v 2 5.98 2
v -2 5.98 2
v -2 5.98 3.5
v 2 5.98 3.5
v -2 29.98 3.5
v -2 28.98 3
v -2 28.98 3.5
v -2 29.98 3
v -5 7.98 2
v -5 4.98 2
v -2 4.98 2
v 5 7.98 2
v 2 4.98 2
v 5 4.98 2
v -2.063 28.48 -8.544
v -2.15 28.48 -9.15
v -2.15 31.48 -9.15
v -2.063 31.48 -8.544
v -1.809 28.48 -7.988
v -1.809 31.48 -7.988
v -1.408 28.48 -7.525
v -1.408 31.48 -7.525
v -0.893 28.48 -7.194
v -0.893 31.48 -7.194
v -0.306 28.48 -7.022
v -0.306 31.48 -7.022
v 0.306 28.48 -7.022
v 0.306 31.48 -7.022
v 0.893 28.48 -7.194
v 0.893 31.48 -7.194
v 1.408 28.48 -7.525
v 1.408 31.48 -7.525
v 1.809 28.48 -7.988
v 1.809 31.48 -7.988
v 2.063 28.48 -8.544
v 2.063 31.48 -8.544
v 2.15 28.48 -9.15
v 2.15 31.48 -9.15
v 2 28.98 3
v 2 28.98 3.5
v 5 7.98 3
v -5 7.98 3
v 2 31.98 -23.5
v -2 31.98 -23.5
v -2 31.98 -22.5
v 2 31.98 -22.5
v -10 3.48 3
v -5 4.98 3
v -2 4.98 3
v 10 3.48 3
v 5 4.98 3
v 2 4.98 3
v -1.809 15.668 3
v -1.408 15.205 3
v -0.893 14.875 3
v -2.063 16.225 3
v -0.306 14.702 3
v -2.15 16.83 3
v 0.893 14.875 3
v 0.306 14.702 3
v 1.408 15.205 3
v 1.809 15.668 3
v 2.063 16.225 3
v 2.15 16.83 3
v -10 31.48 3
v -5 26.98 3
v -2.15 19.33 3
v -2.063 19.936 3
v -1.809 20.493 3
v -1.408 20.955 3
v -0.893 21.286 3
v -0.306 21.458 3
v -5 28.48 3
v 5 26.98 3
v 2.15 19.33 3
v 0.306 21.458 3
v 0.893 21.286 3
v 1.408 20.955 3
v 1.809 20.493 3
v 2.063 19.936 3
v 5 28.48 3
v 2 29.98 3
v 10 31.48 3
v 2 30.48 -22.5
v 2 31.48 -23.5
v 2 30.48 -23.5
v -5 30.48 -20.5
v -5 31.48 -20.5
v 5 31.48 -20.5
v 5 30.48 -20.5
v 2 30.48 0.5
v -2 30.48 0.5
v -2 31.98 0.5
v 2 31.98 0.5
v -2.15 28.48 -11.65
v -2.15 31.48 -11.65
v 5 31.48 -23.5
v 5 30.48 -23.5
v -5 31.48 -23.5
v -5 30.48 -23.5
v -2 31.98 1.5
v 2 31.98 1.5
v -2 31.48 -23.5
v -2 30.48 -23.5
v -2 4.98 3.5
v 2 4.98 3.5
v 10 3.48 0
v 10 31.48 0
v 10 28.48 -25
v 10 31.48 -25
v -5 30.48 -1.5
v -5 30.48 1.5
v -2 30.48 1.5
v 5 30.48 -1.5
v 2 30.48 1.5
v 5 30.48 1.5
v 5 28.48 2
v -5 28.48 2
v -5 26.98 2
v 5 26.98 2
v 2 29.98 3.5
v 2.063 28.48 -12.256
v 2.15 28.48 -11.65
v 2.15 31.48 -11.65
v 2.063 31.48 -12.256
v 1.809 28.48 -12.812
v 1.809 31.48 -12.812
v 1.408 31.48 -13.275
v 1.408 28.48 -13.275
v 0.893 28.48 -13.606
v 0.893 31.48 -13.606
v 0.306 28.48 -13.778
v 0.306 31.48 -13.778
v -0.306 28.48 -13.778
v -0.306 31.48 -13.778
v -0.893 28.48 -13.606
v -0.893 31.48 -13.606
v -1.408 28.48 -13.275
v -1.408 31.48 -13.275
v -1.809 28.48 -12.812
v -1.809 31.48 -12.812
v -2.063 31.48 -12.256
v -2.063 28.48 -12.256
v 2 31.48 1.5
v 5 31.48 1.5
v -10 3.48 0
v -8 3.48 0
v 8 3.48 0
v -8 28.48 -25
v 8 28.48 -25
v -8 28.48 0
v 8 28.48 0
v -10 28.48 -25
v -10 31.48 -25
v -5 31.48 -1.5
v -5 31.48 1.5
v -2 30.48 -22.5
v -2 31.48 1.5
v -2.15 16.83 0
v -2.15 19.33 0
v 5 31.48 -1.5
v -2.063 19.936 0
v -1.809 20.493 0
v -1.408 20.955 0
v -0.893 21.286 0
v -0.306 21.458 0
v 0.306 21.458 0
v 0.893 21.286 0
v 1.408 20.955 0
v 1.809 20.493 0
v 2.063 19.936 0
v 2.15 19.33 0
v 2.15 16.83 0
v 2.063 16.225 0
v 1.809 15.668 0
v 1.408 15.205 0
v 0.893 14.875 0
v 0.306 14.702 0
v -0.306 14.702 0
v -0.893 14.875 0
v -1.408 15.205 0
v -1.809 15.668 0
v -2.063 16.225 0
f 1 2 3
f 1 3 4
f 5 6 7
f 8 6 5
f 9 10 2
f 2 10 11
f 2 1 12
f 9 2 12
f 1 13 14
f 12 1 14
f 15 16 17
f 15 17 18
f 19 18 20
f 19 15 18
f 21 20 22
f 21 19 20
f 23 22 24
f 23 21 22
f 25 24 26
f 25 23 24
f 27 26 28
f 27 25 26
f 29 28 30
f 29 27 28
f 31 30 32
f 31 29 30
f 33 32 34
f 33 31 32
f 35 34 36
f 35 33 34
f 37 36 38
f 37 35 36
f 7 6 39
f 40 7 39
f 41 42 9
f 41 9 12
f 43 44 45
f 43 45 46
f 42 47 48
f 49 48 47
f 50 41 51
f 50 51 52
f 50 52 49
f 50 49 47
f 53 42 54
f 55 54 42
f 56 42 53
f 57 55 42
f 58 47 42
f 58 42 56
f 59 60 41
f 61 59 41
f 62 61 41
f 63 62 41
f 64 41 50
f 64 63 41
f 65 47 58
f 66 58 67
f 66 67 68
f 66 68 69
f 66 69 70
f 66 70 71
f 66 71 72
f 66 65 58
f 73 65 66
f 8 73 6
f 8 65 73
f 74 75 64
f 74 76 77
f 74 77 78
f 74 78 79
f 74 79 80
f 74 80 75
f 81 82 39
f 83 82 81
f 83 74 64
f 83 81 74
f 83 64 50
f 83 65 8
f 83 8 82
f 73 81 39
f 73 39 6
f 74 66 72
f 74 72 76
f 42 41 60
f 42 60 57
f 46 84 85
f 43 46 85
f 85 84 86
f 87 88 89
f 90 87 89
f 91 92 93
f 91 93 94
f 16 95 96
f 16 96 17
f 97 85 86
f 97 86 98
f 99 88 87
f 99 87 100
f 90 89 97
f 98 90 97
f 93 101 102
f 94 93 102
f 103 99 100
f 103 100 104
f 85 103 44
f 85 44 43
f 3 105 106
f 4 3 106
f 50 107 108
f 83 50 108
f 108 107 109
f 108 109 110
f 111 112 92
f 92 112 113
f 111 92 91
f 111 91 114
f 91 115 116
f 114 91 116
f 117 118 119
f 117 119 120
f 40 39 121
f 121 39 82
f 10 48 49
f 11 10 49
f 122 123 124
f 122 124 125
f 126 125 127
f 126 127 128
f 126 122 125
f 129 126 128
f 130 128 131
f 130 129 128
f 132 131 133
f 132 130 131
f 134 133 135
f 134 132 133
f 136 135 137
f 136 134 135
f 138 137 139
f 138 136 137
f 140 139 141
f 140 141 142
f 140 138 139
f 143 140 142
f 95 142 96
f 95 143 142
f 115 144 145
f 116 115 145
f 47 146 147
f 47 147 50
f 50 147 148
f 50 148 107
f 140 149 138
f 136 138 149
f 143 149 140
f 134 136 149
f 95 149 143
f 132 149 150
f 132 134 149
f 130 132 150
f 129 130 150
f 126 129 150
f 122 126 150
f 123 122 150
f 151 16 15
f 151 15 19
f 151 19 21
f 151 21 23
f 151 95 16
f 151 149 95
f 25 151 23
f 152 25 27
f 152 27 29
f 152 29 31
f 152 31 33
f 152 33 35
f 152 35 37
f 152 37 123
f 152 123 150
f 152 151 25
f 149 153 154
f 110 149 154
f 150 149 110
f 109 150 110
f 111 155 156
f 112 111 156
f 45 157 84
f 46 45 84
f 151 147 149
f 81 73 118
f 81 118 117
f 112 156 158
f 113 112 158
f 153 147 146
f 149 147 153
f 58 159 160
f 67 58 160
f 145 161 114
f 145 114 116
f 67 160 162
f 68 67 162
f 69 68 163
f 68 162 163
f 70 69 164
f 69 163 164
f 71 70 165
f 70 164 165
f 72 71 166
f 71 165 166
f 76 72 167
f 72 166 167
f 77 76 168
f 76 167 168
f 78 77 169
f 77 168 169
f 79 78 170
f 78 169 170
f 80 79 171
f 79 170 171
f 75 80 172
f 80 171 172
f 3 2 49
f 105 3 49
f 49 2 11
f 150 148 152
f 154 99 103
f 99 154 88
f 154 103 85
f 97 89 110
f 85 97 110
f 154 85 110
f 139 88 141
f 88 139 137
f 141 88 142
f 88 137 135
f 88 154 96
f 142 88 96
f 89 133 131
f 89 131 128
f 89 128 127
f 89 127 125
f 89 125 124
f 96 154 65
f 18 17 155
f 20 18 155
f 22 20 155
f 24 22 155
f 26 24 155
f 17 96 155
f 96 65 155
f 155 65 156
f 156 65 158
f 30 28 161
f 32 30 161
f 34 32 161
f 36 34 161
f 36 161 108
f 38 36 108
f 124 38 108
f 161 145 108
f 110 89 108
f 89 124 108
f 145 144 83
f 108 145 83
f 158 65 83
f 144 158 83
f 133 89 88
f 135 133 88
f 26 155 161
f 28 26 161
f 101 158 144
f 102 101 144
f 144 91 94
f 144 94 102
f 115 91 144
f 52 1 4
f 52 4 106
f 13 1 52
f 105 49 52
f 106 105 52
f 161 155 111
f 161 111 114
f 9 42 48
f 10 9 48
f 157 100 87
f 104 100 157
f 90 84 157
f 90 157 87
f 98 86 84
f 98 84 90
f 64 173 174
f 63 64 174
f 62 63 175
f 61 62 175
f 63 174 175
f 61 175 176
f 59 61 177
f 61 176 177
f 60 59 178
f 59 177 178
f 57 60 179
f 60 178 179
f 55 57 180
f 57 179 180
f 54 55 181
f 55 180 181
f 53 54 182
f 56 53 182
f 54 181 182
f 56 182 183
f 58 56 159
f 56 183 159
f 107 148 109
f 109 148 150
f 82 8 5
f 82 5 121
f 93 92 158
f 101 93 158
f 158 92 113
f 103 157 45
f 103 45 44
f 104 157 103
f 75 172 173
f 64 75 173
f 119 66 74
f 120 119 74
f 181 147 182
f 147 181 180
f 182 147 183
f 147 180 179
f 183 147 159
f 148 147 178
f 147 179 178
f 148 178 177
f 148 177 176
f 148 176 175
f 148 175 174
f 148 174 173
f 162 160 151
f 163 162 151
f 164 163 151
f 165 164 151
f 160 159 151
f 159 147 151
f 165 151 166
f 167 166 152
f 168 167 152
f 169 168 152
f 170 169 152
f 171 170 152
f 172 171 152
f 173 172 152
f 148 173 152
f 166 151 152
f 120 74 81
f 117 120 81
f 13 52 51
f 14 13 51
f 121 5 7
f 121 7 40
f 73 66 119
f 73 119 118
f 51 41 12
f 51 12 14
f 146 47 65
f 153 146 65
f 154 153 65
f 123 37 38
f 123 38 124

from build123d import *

# Parameters (mm, degrees)
SKETCH_1_W               = 20
SKETCH_1_H               = 28
EXTRUDE_1_DEPTH          = 3
SKETCH_2_W               = 10
SKETCH_2_H               = 3
CUT_EXTRUDE_1_DEPTH      = 1
SKETCH_3_W               = 4
SKETCH_3_H               = 1
EXTRUDE_2_DEPTH          = 1.5
MIRROR_2_COPY_1_SKETCH_W = 10
MIRROR_2_COPY_1_SKETCH_H = 3
MIRROR_2_COPY_1_DEPTH    = 1
MIRROR_2_COPY_2_SKETCH_W = 4
MIRROR_2_COPY_2_SKETCH_H = 1
MIRROR_2_COPY_2_DEPTH    = 1.5
RIB_2_REACH              = 47.252
SKETCH_4_WALL_W          = 127.859233498
SKETCH_4_WALL_H          = 2


with BuildPart() as part:
    # 草图1 → 凸台-拉伸1 (new body)
    with BuildSketch(Plane.XY):
        with Locations((0, 17.480286539)):
            Rectangle(SKETCH_1_W, SKETCH_1_H)
        with BuildLine():
            Line((2.15, 19.330286539), (2.15, 16.830286539))
            ThreePointArc((2.15, 16.830286539), (0, 14.680286539), (-2.15, 16.830286539))
            Line((-2.15, 16.830286539), (-2.15, 19.330286539))
            ThreePointArc((-2.15, 19.330286539), (0, 21.480286539), (2.15, 19.330286539))
        make_face(mode=Mode.SUBTRACT)
    extrude_1 = extrude(amount=EXTRUDE_1_DEPTH)

    # 草图2 → 切除-拉伸1 (cut)
    with BuildSketch(Plane.XY.offset(3)):
        with Locations((0, 28.480286539)):
            Rectangle(SKETCH_2_W, SKETCH_2_H)
    cut_extrude_1 = extrude(amount=-CUT_EXTRUDE_1_DEPTH, mode=Mode.SUBTRACT)

    # 草图3 → 凸台-拉伸2 (add)
    with BuildSketch(Plane.XY.offset(2)):
        with Locations((0, 29.480286539)):
            Rectangle(SKETCH_3_W, SKETCH_3_H)
    extrude_2 = extrude(amount=EXTRUDE_2_DEPTH)

    # 镜向1: 切除-拉伸1, 凸台-拉伸2 across plane
    add(cut_extrude_1.mirror(Plane.ZX.offset(17.480286539)), mode=Mode.SUBTRACT)
    add(extrude_2.mirror(Plane.ZX.offset(17.480286539)))

    # 镜向2: 凸台-拉伸1, 切除-拉伸1, 凸台-拉伸2 across plane
    add(extrude_1.mirror(Plane(origin=(0, 14.240143269, -14.240143269), x_dir=(0, 0.7071067811865478, 0.7071067811865472), z_dir=(0, -0.7071067811865475, 0.7071067811865477))))
    add(cut_extrude_1.mirror(Plane(origin=(0, 14.240143269, -14.240143269), x_dir=(0, 0.7071067811865478, 0.7071067811865472), z_dir=(0, -0.7071067811865475, 0.7071067811865477))), mode=Mode.SUBTRACT)
    add(extrude_2.mirror(Plane(origin=(0, 14.240143269, -14.240143269), x_dir=(0, 0.7071067811865478, 0.7071067811865472), z_dir=(0, -0.7071067811865475, 0.7071067811865477))))

    # 镜向2 copy 1 sketch → 镜向2 copy 1 (cut)
    with BuildSketch(Plane(origin=(0, 31.480286539, 6.480286539), x_dir=(1, 0, 0), z_dir=(0, 1, 0))):
        with Locations((0, 28.480286539)):
            Rectangle(MIRROR_2_COPY_1_SKETCH_W, MIRROR_2_COPY_1_SKETCH_H)
    extrude(amount=-MIRROR_2_COPY_1_DEPTH, mode=Mode.SUBTRACT)

    # 镜向2 copy 2 sketch → 镜向2 copy 2 (add)
    with BuildSketch(Plane(origin=(0, 30.480286539, 6.480286539), x_dir=(1, 0, 0), z_dir=(0, 1, 0))):
        with Locations((0, 29.480286539)):
            Rectangle(MIRROR_2_COPY_2_SKETCH_W, MIRROR_2_COPY_2_SKETCH_H)
    extrude(amount=MIRROR_2_COPY_2_DEPTH)

    # 草图4 wall → 筋2 (add, up to next)
    with BuildSketch(Plane(origin=(10, 15.980286539, -12.5), x_dir=(0, 0.707106781187, -0.707106781187), z_dir=(0, 0.707106781187, 0.707106781187)), mode=Mode.PRIVATE) as rib_2_sk1:
        with Locations((0, 1)):
            Rectangle(SKETCH_4_WALL_W, SKETCH_4_WALL_H)
    rib_2_tool1 = extrude(rib_2_sk1.sketch, amount=RIB_2_REACH, mode=Mode.PRIVATE) - part.part
    rib_2 = rib_2_tool1.solids().sort_by_distance((10, 15.980286539, -12.5))[0]
    add(rib_2)

    # 镜向3: 筋2 across plane
    add(rib_2.mirror(Plane.ZY))


solid = part.part
